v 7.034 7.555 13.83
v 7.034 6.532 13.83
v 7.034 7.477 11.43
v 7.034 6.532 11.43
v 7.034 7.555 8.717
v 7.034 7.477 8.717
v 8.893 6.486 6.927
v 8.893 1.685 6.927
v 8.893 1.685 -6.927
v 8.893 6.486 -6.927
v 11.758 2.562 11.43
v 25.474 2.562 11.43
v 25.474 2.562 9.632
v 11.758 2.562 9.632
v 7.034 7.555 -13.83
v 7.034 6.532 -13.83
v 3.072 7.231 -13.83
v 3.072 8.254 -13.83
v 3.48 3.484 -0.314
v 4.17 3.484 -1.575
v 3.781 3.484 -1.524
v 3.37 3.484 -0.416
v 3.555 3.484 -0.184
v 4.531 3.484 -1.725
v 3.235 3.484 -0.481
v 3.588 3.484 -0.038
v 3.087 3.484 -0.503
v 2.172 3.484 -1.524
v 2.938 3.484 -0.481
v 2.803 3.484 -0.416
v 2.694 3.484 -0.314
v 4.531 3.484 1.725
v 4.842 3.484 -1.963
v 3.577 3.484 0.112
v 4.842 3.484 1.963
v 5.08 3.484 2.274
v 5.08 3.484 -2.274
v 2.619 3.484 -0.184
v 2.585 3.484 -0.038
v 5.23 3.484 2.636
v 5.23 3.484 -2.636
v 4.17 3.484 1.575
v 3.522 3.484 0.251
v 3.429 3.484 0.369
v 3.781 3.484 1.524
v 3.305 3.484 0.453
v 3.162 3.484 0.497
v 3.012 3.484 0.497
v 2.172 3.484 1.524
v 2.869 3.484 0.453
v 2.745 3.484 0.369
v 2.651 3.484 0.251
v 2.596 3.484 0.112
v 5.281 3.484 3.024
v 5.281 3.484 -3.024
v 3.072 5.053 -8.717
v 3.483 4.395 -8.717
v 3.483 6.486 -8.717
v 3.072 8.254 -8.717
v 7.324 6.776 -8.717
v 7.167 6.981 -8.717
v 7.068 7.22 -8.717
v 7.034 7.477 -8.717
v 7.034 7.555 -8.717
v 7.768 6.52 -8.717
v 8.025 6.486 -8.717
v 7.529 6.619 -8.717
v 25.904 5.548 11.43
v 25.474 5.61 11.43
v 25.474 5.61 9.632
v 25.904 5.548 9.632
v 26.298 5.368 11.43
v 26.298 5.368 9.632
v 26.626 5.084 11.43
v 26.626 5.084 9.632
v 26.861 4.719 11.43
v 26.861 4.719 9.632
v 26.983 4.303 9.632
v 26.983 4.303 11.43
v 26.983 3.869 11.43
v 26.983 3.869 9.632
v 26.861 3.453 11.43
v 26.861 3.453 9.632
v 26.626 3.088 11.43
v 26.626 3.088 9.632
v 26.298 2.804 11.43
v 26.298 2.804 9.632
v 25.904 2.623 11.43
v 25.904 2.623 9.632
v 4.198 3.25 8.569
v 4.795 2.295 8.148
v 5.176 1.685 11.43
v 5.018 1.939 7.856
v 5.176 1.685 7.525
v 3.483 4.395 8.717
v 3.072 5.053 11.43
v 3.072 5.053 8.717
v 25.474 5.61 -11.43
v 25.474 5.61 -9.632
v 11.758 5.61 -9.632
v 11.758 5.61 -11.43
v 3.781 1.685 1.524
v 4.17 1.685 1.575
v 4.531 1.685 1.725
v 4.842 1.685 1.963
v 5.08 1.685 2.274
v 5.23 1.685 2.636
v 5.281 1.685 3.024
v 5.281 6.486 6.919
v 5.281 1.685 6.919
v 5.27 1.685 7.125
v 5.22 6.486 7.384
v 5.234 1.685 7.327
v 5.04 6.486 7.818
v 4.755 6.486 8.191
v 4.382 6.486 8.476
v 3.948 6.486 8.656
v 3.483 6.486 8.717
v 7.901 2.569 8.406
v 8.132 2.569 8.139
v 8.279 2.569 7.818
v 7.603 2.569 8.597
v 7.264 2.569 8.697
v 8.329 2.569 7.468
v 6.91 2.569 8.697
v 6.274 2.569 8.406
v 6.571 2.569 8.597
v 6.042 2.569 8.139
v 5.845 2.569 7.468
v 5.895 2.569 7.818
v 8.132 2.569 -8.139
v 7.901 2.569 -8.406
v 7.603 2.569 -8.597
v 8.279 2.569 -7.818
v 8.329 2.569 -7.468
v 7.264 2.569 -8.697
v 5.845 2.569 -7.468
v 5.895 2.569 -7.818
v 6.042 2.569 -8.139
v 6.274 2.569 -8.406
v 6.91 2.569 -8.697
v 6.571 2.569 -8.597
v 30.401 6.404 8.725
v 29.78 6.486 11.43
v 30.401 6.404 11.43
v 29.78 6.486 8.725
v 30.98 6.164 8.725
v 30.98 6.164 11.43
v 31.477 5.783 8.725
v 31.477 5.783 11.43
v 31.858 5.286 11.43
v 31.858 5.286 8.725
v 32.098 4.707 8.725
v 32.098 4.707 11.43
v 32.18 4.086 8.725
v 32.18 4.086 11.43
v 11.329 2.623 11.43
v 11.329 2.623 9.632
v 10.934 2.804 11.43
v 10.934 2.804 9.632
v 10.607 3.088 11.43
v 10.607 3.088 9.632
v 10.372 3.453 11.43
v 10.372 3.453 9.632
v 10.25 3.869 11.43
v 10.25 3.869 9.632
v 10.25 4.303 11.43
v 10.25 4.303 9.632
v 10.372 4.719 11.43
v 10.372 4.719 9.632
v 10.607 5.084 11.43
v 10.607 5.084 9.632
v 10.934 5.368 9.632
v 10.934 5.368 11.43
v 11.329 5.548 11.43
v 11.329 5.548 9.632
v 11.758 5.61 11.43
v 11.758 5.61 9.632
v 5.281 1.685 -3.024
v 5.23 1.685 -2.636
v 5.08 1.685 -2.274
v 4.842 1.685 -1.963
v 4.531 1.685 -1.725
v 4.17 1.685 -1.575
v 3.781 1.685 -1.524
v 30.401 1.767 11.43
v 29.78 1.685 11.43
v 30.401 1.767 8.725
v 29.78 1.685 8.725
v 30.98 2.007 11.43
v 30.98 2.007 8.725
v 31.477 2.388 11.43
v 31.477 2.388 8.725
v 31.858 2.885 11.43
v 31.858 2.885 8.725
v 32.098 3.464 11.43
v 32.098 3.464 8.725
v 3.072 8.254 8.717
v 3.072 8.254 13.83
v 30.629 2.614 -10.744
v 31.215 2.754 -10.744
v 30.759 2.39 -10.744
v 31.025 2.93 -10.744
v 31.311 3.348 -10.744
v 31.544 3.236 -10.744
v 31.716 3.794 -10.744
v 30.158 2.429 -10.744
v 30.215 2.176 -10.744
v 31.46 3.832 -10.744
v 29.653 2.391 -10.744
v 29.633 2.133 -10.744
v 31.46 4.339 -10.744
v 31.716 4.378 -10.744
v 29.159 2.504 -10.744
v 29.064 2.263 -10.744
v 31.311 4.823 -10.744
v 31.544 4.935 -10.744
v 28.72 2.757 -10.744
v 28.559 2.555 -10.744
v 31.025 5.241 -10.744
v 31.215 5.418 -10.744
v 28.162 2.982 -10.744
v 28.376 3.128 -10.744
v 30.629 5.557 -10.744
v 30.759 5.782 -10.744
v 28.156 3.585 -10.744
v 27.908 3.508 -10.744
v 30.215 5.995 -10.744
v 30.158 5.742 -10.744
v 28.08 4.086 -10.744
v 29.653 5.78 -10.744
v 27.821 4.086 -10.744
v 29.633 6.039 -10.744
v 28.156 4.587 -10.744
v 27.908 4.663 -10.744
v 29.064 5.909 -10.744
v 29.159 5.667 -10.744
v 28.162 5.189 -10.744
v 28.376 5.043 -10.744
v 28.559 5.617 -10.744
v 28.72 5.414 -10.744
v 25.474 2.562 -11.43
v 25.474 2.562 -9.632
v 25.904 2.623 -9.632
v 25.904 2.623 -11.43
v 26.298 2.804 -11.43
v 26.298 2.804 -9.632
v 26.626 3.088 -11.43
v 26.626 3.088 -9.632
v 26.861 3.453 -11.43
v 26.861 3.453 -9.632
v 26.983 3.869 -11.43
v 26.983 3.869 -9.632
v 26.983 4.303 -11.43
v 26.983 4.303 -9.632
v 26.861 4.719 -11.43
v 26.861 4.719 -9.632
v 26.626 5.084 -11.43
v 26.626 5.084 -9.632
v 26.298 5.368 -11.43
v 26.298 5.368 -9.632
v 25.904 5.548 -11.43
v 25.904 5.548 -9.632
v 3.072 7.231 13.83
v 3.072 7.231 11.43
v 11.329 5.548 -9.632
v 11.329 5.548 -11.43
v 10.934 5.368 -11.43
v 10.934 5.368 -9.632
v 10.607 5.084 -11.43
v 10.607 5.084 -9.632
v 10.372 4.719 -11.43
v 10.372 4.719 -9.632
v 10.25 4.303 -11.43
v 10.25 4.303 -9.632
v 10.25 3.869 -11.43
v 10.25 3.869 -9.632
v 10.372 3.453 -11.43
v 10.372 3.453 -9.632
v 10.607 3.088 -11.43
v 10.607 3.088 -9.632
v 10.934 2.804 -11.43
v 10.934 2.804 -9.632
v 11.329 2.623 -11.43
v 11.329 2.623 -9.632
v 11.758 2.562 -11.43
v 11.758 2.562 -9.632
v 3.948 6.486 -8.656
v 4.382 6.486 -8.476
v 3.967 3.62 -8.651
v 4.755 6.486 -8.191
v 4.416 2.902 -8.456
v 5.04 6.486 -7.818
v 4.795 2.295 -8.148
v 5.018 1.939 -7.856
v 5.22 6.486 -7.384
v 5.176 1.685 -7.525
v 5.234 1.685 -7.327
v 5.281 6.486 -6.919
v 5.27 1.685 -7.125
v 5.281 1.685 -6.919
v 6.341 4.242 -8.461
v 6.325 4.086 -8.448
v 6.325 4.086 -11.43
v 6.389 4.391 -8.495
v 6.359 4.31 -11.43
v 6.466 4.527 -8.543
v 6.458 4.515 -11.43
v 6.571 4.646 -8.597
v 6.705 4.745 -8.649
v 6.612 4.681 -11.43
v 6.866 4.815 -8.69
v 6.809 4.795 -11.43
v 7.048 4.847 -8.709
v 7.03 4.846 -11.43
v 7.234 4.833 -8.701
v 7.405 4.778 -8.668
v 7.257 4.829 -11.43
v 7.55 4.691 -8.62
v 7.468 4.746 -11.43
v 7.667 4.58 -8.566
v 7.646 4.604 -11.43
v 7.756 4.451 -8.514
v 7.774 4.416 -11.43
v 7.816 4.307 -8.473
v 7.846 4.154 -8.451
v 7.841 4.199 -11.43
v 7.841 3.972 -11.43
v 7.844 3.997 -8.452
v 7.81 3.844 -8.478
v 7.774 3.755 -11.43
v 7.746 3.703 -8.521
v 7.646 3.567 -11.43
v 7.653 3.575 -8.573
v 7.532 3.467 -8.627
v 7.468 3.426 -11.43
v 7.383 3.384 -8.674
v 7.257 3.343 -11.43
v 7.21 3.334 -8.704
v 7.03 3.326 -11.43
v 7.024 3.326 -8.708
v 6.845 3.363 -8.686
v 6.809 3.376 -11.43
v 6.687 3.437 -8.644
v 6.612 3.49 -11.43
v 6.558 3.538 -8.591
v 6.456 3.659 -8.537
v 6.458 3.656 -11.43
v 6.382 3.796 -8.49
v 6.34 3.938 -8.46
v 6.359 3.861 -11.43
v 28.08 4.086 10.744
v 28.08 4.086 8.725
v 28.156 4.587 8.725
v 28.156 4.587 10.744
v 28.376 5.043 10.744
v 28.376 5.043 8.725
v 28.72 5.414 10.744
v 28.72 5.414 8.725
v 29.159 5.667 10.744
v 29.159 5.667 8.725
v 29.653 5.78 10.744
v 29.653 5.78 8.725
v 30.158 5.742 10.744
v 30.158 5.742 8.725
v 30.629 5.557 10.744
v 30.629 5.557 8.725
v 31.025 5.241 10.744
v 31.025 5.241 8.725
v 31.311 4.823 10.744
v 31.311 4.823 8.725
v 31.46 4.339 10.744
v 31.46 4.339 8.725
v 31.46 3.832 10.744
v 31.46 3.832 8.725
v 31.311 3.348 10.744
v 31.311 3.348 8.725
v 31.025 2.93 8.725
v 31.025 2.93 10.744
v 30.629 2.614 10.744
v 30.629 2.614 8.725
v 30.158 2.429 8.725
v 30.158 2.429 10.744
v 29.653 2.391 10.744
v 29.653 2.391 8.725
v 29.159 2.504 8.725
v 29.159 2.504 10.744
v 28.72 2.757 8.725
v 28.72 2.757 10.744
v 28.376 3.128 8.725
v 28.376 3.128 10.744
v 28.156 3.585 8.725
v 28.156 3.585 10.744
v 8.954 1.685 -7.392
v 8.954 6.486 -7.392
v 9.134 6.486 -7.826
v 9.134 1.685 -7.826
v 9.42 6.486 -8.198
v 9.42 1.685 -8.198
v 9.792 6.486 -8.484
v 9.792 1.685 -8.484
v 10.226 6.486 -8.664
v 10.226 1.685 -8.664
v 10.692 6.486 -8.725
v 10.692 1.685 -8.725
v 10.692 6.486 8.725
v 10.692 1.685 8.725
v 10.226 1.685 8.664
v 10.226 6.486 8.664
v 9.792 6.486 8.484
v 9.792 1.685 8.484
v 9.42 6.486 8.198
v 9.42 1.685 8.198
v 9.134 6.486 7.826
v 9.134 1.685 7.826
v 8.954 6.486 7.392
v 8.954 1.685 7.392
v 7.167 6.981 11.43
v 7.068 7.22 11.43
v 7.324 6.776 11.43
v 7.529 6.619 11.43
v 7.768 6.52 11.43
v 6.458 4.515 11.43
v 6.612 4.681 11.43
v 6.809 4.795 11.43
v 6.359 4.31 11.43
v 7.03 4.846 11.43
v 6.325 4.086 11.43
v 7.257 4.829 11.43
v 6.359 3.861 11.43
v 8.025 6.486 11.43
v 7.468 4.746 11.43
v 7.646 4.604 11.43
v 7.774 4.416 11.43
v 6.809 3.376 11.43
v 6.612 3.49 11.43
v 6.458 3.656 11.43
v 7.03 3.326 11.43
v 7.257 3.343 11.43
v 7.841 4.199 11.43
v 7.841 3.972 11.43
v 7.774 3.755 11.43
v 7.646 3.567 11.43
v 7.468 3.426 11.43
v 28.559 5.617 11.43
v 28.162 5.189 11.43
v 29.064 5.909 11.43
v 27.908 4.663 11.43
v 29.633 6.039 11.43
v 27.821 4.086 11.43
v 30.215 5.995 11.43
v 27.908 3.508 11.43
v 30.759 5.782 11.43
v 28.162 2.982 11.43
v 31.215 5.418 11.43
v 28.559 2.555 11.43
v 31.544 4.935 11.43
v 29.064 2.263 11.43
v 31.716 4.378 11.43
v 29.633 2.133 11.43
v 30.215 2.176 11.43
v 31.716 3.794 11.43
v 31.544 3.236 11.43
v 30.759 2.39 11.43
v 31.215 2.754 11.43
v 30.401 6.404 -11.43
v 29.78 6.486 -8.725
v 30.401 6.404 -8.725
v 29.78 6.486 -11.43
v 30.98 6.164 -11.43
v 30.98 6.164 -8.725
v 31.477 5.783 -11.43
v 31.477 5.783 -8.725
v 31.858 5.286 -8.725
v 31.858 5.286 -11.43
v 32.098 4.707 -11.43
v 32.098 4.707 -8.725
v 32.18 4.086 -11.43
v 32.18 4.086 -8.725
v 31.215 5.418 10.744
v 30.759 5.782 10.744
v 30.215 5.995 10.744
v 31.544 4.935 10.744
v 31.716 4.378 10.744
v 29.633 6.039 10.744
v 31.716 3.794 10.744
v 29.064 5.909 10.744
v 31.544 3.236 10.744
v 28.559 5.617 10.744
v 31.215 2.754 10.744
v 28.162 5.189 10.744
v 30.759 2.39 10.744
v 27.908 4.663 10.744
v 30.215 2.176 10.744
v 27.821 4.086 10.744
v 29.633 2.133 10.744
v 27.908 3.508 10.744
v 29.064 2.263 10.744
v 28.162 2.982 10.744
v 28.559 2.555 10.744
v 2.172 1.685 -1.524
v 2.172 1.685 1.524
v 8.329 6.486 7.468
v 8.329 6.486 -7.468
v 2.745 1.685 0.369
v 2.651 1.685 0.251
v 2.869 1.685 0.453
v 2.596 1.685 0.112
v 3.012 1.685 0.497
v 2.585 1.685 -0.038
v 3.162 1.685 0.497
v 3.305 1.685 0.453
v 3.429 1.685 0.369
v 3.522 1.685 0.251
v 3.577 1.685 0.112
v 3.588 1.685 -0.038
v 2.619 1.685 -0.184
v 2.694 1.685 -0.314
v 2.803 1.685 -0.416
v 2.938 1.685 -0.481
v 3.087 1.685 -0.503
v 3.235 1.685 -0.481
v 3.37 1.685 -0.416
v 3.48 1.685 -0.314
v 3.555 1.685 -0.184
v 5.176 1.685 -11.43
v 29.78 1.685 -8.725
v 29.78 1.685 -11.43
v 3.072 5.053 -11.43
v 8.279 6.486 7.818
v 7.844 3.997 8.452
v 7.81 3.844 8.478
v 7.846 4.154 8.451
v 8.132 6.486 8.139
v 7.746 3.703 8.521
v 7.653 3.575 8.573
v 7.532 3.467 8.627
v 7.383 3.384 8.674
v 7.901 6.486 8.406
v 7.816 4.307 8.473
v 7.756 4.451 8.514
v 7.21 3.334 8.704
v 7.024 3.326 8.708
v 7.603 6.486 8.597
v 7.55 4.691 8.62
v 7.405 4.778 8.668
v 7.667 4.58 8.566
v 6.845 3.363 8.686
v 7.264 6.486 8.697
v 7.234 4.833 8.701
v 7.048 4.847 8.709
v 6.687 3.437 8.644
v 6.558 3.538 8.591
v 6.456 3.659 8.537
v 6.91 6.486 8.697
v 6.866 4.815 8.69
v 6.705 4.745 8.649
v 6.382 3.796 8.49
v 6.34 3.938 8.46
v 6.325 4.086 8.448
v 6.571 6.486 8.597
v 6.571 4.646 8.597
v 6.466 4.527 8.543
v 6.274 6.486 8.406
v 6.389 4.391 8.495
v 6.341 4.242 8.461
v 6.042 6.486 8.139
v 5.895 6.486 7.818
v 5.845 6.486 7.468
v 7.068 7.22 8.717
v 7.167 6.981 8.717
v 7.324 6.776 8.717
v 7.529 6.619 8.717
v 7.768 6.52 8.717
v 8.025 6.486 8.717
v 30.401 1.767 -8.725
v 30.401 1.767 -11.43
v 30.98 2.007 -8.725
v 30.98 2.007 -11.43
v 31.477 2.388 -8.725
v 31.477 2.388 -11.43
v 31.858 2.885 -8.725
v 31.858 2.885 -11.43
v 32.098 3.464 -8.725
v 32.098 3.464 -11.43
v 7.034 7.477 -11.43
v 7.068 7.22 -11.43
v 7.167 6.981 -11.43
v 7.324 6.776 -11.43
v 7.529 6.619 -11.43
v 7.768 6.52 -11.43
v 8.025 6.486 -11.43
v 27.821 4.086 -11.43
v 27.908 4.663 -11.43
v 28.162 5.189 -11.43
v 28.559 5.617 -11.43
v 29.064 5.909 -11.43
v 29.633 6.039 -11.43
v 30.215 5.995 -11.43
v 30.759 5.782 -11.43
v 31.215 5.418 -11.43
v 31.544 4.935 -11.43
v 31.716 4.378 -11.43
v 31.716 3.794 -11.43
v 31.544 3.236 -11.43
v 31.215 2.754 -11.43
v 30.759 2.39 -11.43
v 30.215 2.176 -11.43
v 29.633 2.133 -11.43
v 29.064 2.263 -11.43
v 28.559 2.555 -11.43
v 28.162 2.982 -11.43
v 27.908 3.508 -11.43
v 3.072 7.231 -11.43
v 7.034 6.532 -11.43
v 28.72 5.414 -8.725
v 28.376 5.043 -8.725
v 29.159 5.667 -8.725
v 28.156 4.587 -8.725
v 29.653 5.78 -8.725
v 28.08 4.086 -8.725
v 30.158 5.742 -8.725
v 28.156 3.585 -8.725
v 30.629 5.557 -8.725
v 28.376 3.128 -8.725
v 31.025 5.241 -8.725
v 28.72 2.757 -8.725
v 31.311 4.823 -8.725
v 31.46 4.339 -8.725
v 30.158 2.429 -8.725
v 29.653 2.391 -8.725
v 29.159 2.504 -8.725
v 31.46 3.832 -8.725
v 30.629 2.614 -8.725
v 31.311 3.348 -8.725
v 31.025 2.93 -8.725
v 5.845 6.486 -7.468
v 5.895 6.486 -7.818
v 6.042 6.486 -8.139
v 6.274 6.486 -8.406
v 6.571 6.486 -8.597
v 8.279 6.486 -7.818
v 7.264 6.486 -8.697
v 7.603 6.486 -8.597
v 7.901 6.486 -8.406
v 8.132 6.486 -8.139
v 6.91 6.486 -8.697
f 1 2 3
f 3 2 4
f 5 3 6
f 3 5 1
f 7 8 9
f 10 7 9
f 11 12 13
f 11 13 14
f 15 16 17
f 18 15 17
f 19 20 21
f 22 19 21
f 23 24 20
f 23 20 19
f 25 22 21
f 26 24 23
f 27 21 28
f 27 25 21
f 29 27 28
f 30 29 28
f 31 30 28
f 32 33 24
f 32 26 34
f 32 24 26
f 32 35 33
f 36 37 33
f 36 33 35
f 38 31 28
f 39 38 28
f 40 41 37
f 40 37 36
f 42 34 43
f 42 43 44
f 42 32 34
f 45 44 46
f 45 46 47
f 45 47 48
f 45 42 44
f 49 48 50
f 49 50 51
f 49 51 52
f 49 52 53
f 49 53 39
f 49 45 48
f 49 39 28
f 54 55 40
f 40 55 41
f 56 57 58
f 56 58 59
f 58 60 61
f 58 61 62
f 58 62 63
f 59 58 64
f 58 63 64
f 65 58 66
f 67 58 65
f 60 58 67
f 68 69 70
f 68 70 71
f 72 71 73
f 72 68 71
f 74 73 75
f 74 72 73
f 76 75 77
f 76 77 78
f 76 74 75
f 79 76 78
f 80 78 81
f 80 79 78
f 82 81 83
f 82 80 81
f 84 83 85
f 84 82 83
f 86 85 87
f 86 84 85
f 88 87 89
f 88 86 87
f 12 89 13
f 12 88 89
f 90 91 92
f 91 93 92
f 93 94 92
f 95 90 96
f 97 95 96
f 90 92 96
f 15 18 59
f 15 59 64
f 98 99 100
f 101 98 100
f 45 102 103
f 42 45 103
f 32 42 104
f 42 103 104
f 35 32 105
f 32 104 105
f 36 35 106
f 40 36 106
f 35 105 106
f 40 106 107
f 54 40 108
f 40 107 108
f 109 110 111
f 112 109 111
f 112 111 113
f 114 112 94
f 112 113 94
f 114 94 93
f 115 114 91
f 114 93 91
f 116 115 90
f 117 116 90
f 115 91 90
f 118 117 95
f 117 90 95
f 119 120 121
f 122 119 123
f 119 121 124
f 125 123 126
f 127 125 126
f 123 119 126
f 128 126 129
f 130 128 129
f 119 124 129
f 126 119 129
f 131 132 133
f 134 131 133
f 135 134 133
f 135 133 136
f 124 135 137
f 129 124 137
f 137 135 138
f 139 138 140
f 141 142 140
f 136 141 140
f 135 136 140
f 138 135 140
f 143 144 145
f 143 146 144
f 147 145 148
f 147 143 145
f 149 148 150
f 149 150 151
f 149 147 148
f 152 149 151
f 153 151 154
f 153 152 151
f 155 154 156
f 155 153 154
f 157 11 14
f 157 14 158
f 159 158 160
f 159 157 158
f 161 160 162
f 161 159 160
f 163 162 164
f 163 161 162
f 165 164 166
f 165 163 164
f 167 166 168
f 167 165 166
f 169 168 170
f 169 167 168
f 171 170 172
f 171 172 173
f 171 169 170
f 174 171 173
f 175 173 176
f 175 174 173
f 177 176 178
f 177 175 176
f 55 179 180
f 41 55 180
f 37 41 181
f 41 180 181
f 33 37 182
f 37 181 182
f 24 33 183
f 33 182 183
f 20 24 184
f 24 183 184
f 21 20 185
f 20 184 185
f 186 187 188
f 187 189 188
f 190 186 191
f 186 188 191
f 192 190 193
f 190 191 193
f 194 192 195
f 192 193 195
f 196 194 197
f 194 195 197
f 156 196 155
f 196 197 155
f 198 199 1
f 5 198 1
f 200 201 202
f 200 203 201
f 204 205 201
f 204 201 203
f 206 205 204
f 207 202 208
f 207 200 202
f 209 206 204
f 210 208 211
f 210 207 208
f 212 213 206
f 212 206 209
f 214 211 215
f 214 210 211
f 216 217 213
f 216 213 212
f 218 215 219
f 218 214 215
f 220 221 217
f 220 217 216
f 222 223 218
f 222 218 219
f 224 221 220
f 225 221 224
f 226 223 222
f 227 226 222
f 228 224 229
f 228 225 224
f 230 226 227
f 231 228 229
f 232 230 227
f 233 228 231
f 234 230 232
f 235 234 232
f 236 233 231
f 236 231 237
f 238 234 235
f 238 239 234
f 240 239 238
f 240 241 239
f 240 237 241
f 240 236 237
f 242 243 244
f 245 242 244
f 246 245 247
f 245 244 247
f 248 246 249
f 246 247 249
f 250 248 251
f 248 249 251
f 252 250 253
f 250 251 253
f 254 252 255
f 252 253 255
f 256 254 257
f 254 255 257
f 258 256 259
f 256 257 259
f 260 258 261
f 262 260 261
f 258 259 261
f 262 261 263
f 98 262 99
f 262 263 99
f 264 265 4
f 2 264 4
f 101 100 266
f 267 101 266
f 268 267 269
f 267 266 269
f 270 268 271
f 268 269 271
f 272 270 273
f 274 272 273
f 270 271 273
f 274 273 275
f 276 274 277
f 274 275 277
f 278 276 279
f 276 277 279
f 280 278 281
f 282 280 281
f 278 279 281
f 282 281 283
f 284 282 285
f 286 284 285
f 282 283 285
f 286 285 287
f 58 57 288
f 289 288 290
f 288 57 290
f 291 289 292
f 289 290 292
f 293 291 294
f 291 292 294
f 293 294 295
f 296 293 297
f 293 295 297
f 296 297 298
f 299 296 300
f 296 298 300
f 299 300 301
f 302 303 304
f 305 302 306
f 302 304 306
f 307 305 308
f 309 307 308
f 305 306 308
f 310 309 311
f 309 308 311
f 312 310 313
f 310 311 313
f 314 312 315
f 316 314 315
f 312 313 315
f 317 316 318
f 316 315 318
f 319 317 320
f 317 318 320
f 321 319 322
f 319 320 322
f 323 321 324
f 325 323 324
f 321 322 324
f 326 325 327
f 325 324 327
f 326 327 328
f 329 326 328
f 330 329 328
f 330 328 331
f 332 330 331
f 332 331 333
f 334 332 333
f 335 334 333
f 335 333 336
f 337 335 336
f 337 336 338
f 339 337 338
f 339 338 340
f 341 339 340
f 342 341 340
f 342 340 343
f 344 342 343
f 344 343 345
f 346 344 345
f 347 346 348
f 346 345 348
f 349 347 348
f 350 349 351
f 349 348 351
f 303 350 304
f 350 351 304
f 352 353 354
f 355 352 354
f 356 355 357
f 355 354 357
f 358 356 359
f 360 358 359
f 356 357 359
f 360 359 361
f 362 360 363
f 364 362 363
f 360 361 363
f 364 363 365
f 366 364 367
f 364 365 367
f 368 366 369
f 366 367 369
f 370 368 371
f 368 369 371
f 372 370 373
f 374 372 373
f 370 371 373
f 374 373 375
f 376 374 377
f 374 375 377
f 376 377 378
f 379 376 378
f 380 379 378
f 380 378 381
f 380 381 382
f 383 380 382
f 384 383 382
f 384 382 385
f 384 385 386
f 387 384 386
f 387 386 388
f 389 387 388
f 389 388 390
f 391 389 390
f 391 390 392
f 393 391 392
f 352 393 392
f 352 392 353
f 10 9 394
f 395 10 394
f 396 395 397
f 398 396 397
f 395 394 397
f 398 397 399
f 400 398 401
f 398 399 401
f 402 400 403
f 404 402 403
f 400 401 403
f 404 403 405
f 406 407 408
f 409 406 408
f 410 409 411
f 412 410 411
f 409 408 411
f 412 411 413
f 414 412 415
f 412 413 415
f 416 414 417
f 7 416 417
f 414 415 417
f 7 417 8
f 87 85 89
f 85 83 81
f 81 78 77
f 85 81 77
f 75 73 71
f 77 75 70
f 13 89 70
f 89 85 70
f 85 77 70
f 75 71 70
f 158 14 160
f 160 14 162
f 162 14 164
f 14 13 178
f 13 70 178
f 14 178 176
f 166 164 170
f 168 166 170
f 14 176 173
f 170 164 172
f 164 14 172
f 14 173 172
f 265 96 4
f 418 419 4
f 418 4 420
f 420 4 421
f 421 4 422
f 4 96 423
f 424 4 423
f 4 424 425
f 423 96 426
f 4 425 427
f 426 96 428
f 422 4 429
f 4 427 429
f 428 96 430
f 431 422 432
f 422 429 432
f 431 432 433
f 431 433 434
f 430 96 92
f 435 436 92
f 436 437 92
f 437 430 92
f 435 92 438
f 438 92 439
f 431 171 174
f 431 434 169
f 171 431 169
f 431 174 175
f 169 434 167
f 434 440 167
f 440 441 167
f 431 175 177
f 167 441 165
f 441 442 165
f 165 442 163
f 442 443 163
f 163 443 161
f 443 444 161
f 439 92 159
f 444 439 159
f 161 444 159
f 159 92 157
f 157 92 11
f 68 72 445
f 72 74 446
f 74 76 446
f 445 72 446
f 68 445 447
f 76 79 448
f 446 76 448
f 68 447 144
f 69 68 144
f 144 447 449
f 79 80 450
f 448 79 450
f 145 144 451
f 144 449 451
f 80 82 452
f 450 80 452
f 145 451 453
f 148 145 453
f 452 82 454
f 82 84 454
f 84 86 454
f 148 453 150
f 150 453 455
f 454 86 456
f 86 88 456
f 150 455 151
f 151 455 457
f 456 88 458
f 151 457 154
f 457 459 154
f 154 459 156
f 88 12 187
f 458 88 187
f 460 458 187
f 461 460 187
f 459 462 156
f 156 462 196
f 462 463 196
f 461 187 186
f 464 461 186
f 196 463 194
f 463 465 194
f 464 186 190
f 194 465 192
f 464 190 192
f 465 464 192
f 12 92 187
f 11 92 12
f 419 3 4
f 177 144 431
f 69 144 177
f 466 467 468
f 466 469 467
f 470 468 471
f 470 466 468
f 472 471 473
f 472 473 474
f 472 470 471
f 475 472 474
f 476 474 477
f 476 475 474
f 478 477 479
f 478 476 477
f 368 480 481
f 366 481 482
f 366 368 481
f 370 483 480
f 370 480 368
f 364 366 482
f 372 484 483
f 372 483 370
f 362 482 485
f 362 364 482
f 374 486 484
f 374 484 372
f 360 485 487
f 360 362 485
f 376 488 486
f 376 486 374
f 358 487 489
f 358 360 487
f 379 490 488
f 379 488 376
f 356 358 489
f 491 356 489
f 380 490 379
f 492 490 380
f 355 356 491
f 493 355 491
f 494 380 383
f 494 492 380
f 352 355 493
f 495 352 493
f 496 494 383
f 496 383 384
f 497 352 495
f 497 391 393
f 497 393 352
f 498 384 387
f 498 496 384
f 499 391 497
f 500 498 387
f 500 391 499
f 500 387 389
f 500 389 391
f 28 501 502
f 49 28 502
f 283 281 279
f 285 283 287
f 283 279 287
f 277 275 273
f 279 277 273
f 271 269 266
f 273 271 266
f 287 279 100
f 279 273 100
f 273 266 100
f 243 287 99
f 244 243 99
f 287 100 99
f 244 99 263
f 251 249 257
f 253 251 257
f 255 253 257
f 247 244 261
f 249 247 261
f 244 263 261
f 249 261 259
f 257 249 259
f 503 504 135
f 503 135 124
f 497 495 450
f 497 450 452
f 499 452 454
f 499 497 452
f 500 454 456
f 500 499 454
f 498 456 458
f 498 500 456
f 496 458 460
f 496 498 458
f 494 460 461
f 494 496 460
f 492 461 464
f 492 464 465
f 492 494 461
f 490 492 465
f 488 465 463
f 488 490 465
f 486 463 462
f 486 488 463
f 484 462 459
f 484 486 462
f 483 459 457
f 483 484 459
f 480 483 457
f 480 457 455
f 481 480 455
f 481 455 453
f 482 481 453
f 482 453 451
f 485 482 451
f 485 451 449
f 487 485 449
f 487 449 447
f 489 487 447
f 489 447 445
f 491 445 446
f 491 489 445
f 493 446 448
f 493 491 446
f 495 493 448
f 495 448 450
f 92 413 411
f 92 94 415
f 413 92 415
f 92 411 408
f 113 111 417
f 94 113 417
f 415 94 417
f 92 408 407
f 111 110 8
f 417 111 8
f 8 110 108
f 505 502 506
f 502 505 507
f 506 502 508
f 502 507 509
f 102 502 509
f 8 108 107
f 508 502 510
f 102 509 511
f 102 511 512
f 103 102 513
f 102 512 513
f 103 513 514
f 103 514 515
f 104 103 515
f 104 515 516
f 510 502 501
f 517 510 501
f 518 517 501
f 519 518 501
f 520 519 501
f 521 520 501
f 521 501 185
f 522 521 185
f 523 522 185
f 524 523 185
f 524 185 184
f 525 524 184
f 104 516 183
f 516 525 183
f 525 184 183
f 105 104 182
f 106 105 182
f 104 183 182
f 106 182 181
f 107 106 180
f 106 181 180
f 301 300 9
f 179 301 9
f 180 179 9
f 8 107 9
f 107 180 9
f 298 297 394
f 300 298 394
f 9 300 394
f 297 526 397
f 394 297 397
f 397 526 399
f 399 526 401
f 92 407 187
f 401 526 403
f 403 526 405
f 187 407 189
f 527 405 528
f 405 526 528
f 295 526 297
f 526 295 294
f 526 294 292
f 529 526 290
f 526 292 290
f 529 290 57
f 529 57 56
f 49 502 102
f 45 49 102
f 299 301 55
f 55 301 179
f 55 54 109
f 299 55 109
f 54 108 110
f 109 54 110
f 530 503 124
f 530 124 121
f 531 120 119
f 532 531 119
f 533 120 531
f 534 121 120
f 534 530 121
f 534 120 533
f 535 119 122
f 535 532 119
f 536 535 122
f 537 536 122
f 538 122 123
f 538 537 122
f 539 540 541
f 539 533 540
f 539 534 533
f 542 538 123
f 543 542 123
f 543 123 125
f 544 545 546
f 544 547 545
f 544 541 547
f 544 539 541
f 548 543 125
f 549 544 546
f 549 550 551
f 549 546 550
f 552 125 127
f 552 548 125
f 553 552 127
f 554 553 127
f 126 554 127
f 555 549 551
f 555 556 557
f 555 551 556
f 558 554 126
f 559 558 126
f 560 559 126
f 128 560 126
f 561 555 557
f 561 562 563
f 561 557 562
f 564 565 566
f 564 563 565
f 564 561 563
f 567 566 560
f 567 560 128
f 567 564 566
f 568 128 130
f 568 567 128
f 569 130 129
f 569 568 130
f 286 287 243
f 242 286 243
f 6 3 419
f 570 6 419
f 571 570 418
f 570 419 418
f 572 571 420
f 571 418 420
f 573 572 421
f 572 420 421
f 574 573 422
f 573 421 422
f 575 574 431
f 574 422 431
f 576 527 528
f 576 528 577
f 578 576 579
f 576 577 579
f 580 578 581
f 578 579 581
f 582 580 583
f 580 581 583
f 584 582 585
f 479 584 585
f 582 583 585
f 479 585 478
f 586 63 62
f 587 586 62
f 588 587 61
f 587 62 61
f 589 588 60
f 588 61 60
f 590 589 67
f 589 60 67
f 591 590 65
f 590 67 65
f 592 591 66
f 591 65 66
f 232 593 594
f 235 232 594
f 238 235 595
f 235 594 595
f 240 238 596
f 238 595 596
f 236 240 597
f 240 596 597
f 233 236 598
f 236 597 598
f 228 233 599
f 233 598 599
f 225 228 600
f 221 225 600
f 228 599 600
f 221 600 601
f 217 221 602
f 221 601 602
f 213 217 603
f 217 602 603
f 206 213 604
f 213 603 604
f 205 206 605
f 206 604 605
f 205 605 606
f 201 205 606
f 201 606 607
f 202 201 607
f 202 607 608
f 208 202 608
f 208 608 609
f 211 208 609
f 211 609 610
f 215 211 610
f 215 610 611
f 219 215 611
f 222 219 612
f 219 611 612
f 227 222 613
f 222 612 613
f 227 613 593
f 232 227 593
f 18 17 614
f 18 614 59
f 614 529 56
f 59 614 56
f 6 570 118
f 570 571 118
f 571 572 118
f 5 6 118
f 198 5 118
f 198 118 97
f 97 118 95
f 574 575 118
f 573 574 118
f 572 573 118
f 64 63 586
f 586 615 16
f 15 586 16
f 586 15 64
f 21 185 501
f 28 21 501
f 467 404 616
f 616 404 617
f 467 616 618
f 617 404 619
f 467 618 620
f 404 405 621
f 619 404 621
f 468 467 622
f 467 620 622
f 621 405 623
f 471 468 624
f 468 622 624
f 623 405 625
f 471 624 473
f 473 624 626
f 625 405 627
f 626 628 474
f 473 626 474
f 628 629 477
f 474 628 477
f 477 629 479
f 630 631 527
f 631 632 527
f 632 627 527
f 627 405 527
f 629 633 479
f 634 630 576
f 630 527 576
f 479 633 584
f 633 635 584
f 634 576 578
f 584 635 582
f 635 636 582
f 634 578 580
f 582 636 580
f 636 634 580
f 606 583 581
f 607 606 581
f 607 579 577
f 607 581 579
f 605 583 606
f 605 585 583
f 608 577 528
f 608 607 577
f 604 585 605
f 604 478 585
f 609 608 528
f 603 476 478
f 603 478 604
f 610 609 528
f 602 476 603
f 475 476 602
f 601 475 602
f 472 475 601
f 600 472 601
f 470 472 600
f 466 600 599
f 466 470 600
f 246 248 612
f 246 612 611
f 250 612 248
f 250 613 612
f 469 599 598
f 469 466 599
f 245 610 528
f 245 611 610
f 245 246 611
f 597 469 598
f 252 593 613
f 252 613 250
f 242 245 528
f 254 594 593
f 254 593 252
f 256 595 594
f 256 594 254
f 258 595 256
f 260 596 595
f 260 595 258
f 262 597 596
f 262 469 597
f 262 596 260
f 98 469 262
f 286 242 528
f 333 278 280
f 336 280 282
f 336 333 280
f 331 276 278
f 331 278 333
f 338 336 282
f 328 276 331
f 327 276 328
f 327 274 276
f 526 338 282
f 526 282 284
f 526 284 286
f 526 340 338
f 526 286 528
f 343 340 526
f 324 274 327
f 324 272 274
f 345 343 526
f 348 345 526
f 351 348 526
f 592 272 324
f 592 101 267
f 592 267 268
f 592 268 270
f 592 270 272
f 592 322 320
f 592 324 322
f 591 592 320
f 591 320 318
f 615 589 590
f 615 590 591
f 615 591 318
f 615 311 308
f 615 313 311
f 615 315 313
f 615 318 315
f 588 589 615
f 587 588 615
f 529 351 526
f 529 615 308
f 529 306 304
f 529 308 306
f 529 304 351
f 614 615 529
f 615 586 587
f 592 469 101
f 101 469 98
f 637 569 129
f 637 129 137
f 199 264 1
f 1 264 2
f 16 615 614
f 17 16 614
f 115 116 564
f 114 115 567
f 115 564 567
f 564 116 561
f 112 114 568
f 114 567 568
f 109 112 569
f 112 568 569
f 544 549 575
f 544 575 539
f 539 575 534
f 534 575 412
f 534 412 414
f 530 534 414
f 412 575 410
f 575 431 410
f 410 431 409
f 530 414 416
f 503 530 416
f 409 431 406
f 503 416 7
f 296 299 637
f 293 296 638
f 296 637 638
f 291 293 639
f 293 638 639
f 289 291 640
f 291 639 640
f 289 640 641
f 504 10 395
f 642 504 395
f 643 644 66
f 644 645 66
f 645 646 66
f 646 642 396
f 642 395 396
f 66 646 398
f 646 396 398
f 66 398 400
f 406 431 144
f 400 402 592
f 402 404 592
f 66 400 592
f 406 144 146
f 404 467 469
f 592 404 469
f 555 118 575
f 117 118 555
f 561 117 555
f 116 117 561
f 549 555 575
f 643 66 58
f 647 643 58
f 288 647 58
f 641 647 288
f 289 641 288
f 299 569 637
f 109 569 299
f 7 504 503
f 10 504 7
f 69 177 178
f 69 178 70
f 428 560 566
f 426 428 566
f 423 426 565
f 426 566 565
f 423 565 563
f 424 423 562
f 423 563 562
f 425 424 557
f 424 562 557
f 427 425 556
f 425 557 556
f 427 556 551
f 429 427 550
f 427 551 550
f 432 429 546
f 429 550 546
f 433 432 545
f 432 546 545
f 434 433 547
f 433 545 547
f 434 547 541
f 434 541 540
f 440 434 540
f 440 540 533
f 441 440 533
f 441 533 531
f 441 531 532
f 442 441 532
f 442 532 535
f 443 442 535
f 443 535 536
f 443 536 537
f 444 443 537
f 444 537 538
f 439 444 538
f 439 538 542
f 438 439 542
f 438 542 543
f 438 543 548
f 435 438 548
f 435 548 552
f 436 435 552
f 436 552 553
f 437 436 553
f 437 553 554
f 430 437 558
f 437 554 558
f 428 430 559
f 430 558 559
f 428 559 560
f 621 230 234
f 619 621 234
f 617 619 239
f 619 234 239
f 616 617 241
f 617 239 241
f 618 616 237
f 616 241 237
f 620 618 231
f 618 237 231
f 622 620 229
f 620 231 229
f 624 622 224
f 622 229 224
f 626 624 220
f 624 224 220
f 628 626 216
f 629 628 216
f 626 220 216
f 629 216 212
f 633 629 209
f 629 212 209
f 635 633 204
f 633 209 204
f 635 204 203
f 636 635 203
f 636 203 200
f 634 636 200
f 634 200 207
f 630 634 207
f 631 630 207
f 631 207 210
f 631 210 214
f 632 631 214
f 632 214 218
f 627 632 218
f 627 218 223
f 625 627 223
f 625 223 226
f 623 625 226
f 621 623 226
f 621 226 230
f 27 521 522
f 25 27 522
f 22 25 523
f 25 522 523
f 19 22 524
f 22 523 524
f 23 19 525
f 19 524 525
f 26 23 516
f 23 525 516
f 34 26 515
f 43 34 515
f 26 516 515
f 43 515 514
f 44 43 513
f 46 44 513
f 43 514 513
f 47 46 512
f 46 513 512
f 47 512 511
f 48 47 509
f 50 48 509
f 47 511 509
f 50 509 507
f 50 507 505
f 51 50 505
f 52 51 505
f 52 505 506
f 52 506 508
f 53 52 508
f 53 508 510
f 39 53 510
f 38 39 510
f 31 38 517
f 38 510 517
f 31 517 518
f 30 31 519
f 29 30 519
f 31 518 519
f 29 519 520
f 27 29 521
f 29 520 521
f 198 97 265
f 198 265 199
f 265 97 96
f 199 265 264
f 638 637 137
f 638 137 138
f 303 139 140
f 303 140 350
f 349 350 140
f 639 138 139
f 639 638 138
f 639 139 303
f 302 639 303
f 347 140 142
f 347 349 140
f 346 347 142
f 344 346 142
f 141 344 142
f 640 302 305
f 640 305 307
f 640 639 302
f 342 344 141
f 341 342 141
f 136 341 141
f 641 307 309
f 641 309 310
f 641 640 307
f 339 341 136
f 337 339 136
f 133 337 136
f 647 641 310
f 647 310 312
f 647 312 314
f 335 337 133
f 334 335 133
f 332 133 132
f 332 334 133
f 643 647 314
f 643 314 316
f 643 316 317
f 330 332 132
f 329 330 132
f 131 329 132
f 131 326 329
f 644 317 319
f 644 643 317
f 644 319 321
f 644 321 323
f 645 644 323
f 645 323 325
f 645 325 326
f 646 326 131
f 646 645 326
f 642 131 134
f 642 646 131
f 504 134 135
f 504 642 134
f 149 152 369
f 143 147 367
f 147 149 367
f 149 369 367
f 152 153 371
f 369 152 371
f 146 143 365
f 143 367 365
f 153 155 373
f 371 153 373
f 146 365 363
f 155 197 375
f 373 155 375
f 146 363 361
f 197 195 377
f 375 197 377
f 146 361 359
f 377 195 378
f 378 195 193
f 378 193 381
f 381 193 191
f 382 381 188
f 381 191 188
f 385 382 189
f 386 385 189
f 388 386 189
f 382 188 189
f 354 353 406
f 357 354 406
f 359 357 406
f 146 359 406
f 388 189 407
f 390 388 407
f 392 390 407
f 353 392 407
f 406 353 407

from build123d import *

# Parameters (mm, degrees)
BOSS_EXTRUDE1_DEPTH = 10.9474
CUT_EXTRUDE1_DEPTH  = 66.230102934
CUT_EXTRUDE2_DEPTH  = 63.46692107
SKETCH4_W           = 29.0576
SKETCH4_H           = 2.9464
CUT_EXTRUDE3_DEPTH  = 10.9474
CUT_EXTRUDE4_DEPTH  = 6.5278
FILLET1_R           = 4.0005
CUT_EXTRUDE5_DEPTH  = 66.230102934
CUT_EXTRUDE6_DEPTH  = 4.0005
CUT_EXTRUDE7_DEPTH  = 4.0005
SKETCH9_R           = 2.8321
CUT_EXTRUDE8_DEPTH  = 63.46692107
SKETCH10_R          = 3.2639
CUT_EXTRUDE9_DEPTH  = 1.143
CUT_EXTRUDE10_START = -1.143
SKETCH11_R          = 3.2639
CUT_EXTRUDE10_DEPTH = 1.143
CUT_EXTRUDE11_DEPTH = 2.9972
CUT_EXTRUDE13_START = -2.9972
CUT_EXTRUDE13_DEPTH = 2.9972
SKETCH14_R          = 1.27
CUT_EXTRUDE14_DEPTH = 63.46692107
SKETCH15_R          = 0.8382
BOSS_EXTRUDE2_DEPTH = 2.9972
CUT_EXTRUDE15_DEPTH = 4.0005
CUT_EXTRUDE16_DEPTH = 4.0005
SCALE1_SCALE        = 0.6


with BuildPart() as part:
    # Sketch1 → Boss-Extrude1 (new body)
    with BuildSketch(Plane(origin=(0, 0, 0), x_dir=(1, 0, 0), z_dir=(0, 1, 0))):
        with BuildLine():
            Line((0, 11.5316), (0, -11.5316))
            ThreePointArc((0, -11.5316), (-0.877859555, -13.650940445), (-2.9972, -14.5288))
            Line((-2.9972, -14.5288), (-3.683, -14.5288))
            Line((-3.683, -14.5288), (-3.683, -23.0505))
            Line((-3.683, -23.0505), (2.921, -23.0505))
            Line((2.921, -23.0505), (2.921, -19.05))
            Line((2.921, -19.05), (44.831, -19.05))
            Line((44.831, -19.05), (44.831, -14.5415))
            Line((44.831, -14.5415), (9.017, -14.5415))
            ThreePointArc((9.017, -14.5415), (6.897659555, -13.663640445), (6.0198, -11.5443))
            Line((6.0198, -11.5443), (6.0198, 11.5443))
            ThreePointArc((6.0198, 11.5443), (6.897659555, 13.663640445), (9.017, 14.5415))
            Line((9.017, 14.5415), (44.831, 14.5415))
            Line((44.831, 14.5415), (44.831, 19.05))
            Line((44.831, 19.05), (2.921, 19.05))
            Line((2.921, 19.05), (2.921, 23.0505))
            Line((2.921, 23.0505), (-3.683, 23.0505))
            Line((-3.683, 23.0505), (-3.683, 14.5288))
            Line((-3.683, 14.5288), (-2.9972, 14.5288))
            ThreePointArc((-2.9972, 14.5288), (-0.877859555, 13.650940445), (0, 11.5316))
        make_face()
    extrude(amount=BOSS_EXTRUDE1_DEPTH)

    # Sketch2 → Cut-Extrude1 (cut, through all)
    with BuildSketch(Plane.XY.offset(23.0505)):
        Polygon((-0.17535838, 0), (-3.683, 5.6134), (-3.683, 0), align=None)
    extrude(amount=-CUT_EXTRUDE1_DEPTH, mode=Mode.SUBTRACT)

    # Sketch3 → Cut-Extrude2 (cut, through all)
    with BuildSketch(Plane.XY.offset(19.05)):
        with BuildLine():
            Line((4.572, 8.001), (44.831, 8.001))
            Line((44.831, 8.001), (44.831, 10.9474))
            Line((44.831, 10.9474), (2.921, 10.9474))
            Line((2.921, 10.9474), (2.921, 9.652))
            ThreePointArc((2.921, 9.652), (3.404566704, 8.484566704), (4.572, 8.001))
        make_face()
    extrude(amount=-CUT_EXTRUDE2_DEPTH, mode=Mode.SUBTRACT)

    # Sketch4 → Cut-Extrude3 (cut)
    with BuildSketch(Plane(origin=(6.0198, 0, 0), x_dir=(0, 0, -1), z_dir=(1, 0, 0))):
        with Locations((0, 9.4742)):
            Rectangle(SKETCH4_W, SKETCH4_H)
    extrude(amount=-CUT_EXTRUDE3_DEPTH, mode=Mode.SUBTRACT)

    # Sketch5 → Cut-Extrude4 (cut)
    with BuildSketch(Plane(origin=(0, 8.001, 0), x_dir=(1, 0, 0), z_dir=(0, 1, 0))):
        with BuildLine():
            Line((0.9398, -12.446), (0.9398, 12.446))
            ThreePointArc((0.9398, 12.446), (3.0099, 14.5161), (5.08, 12.446))
            Line((5.08, 12.446), (5.08, -12.446))
            ThreePointArc((5.08, -12.446), (3.0099, -14.5161), (0.9398, -12.446))
        make_face()
    extrude(amount=-CUT_EXTRUDE4_DEPTH, mode=Mode.SUBTRACT)

    # Fillet1
    fillet1_edges = [part.edges().sort_by_distance(p)[0] for p in [
        (44.831, 8.001, -16.79575),
        (44.831, 0, -16.79575),
        (44.831, 0, 16.79575),
        (44.831, 8.001, 16.79575),
    ]]
    fillet(fillet1_edges, radius=FILLET1_R - 0.0001)  # a hair under: the kernel refuses the full size

    # Sketch6 → Cut-Extrude5 (cut, through all)
    with BuildSketch(Plane.XY.offset(23.0505)):
        Polygon((-3.683, 10.9474), (2.921, 9.782936619), (2.921, 10.9474), align=None)
    extrude(amount=-CUT_EXTRUDE5_DEPTH, mode=Mode.SUBTRACT)

    # Sketch7 → Cut-Extrude6 (cut)
    with BuildSketch(Plane.XY.offset(23.0505)):
        Polygon((-3.683, 8.987220468), (-3.683, 5.6134), (-0.17535838, 0), (2.921, 0), (2.921, 7.822757088), align=None)
    extrude(amount=-CUT_EXTRUDE6_DEPTH, mode=Mode.SUBTRACT)

    # Sketch8 → Cut-Extrude7 (cut)
    with BuildSketch(Plane(origin=(0, 0, -23.0505), x_dir=(-1, 0, 0), z_dir=(0, 0, -1))):
        Polygon((3.683, 8.987220468), (-2.921, 7.822757088), (-2.921, 0), (0.17535838, 0), (3.683, 5.6134), align=None)
    extrude(amount=-CUT_EXTRUDE7_DEPTH, mode=Mode.SUBTRACT)

    # Sketch9 → Cut-Extrude8 (cut, through all)
    with BuildSketch(Plane(origin=(0, 0, -19.05), x_dir=(-1, 0, 0), z_dir=(0, 0, -1))):
        with Locations((-40.8305, 4.0005)):
            Circle(SKETCH9_R)
    extrude(amount=-CUT_EXTRUDE8_DEPTH, mode=Mode.SUBTRACT)

    # Sketch10 → Cut-Extrude9 (cut)
    with BuildSketch(Plane(origin=(0, 0, -19.05), x_dir=(-1, 0, 0), z_dir=(0, 0, -1))):
        with Locations((-40.8305, 4.0005)):
            Circle(SKETCH10_R)
    extrude(amount=-CUT_EXTRUDE9_DEPTH, mode=Mode.SUBTRACT)

    # Sketch11 → Cut-Extrude10 (cut)
    with BuildSketch(Plane.XY.offset(19.05).offset(CUT_EXTRUDE10_START)):
        with Locations(Location((40.8305, 4.0005, 0), (0, 0, 180))):
            Circle(SKETCH11_R)
    extrude(amount=CUT_EXTRUDE10_DEPTH, mode=Mode.SUBTRACT)

    # Sketch12 → Cut-Extrude11 (cut)
    with BuildSketch(Plane.XY.offset(19.05)):
        with BuildLine():
            Line((33.655, 1.4605), (10.795, 1.4605))
            ThreePointArc((10.795, 1.4605), (8.255, 4.0005), (10.795, 6.5405))
            Line((10.795, 6.5405), (33.655, 6.5405))
            ThreePointArc((33.655, 6.5405), (36.195, 4.0005), (33.655, 1.4605))
        make_face()
    extrude(amount=-CUT_EXTRUDE11_DEPTH, mode=Mode.SUBTRACT)

    # Sketch13 → Cut-Extrude13 (cut)
    with BuildSketch(Plane(origin=(0, 0, -19.05), x_dir=(-1, 0, 0), z_dir=(0, 0, -1)).offset(CUT_EXTRUDE13_START)):
        with BuildLine():
            Line((-33.655, 6.5405), (-10.795, 6.5405))
            ThreePointArc((-10.795, 6.5405), (-8.255, 4.0005), (-10.795, 1.4605))
            Line((-10.795, 1.4605), (-33.655, 1.4605))
            ThreePointArc((-33.655, 1.4605), (-36.195, 4.0005), (-33.655, 6.5405))
        make_face()
    extrude(amount=CUT_EXTRUDE13_DEPTH, mode=Mode.SUBTRACT)

    # Sketch14 → Cut-Extrude14 (cut, through all)
    with BuildSketch(Plane(origin=(0, 0, -19.05), x_dir=(-1, 0, 0), z_dir=(0, 0, -1))):
        with Locations((-3.0099, 4.0005)):
            Circle(SKETCH14_R)
    extrude(amount=-CUT_EXTRUDE14_DEPTH, mode=Mode.SUBTRACT)

    # Sketch15 → Boss-Extrude2 (add)
    with BuildSketch(Plane.XZ):
        with BuildLine():
            Line((-5.1816, -2.54), (-5.1816, 2.54))
            Line((-5.1816, 2.54), (-2.499999953, 2.54))
            ThreePointArc((-2.499999953, 2.54), (-0.732233033, 3.272233033), (0, 5.039999953))
            Line((0, 5.039999953), (0, -5.039999953))
            ThreePointArc((0, -5.039999953), (-0.732233033, -3.272233033), (-2.499999953, -2.54))
            Line((-2.499999953, -2.54), (-5.1816, -2.54))
        make_face()
        with Locations(Location((-3.657652297, 0, 0), (0, 0, 270))):
            Circle(SKETCH15_R, mode=Mode.SUBTRACT)
    extrude(amount=-BOSS_EXTRUDE2_DEPTH)

    # Sketch16 → Cut-Extrude15 (cut)
    with BuildSketch(Plane.XY.offset(19.05)):
        Polygon((2.921, 7.822757088), (-3.683, 8.987220468), (-3.683, 9.24285301), (2.921, 8.078389629), align=None)
    extrude(amount=CUT_EXTRUDE15_DEPTH, mode=Mode.SUBTRACT)

    # Sketch17 → Cut-Extrude16 (cut)
    with BuildSketch(Plane(origin=(0, 0, -19.05), x_dir=(-1, 0, 0), z_dir=(0, 0, -1))):
        Polygon((-2.921, 8.078389629), (3.683, 9.24285301), (3.683, 8.987220468), (-2.921, 7.822757088), align=None)
    extrude(amount=CUT_EXTRUDE16_DEPTH, mode=Mode.SUBTRACT)


with BuildPart() as part_1:
    # Scale1: scaled about (13.203263525, 4.213395444, -2.977e-06)
    add(part.part.scale(SCALE1_SCALE).moved(Location((5.28130541, 1.685358178, -1.191e-06))))


solid = part_1.part
